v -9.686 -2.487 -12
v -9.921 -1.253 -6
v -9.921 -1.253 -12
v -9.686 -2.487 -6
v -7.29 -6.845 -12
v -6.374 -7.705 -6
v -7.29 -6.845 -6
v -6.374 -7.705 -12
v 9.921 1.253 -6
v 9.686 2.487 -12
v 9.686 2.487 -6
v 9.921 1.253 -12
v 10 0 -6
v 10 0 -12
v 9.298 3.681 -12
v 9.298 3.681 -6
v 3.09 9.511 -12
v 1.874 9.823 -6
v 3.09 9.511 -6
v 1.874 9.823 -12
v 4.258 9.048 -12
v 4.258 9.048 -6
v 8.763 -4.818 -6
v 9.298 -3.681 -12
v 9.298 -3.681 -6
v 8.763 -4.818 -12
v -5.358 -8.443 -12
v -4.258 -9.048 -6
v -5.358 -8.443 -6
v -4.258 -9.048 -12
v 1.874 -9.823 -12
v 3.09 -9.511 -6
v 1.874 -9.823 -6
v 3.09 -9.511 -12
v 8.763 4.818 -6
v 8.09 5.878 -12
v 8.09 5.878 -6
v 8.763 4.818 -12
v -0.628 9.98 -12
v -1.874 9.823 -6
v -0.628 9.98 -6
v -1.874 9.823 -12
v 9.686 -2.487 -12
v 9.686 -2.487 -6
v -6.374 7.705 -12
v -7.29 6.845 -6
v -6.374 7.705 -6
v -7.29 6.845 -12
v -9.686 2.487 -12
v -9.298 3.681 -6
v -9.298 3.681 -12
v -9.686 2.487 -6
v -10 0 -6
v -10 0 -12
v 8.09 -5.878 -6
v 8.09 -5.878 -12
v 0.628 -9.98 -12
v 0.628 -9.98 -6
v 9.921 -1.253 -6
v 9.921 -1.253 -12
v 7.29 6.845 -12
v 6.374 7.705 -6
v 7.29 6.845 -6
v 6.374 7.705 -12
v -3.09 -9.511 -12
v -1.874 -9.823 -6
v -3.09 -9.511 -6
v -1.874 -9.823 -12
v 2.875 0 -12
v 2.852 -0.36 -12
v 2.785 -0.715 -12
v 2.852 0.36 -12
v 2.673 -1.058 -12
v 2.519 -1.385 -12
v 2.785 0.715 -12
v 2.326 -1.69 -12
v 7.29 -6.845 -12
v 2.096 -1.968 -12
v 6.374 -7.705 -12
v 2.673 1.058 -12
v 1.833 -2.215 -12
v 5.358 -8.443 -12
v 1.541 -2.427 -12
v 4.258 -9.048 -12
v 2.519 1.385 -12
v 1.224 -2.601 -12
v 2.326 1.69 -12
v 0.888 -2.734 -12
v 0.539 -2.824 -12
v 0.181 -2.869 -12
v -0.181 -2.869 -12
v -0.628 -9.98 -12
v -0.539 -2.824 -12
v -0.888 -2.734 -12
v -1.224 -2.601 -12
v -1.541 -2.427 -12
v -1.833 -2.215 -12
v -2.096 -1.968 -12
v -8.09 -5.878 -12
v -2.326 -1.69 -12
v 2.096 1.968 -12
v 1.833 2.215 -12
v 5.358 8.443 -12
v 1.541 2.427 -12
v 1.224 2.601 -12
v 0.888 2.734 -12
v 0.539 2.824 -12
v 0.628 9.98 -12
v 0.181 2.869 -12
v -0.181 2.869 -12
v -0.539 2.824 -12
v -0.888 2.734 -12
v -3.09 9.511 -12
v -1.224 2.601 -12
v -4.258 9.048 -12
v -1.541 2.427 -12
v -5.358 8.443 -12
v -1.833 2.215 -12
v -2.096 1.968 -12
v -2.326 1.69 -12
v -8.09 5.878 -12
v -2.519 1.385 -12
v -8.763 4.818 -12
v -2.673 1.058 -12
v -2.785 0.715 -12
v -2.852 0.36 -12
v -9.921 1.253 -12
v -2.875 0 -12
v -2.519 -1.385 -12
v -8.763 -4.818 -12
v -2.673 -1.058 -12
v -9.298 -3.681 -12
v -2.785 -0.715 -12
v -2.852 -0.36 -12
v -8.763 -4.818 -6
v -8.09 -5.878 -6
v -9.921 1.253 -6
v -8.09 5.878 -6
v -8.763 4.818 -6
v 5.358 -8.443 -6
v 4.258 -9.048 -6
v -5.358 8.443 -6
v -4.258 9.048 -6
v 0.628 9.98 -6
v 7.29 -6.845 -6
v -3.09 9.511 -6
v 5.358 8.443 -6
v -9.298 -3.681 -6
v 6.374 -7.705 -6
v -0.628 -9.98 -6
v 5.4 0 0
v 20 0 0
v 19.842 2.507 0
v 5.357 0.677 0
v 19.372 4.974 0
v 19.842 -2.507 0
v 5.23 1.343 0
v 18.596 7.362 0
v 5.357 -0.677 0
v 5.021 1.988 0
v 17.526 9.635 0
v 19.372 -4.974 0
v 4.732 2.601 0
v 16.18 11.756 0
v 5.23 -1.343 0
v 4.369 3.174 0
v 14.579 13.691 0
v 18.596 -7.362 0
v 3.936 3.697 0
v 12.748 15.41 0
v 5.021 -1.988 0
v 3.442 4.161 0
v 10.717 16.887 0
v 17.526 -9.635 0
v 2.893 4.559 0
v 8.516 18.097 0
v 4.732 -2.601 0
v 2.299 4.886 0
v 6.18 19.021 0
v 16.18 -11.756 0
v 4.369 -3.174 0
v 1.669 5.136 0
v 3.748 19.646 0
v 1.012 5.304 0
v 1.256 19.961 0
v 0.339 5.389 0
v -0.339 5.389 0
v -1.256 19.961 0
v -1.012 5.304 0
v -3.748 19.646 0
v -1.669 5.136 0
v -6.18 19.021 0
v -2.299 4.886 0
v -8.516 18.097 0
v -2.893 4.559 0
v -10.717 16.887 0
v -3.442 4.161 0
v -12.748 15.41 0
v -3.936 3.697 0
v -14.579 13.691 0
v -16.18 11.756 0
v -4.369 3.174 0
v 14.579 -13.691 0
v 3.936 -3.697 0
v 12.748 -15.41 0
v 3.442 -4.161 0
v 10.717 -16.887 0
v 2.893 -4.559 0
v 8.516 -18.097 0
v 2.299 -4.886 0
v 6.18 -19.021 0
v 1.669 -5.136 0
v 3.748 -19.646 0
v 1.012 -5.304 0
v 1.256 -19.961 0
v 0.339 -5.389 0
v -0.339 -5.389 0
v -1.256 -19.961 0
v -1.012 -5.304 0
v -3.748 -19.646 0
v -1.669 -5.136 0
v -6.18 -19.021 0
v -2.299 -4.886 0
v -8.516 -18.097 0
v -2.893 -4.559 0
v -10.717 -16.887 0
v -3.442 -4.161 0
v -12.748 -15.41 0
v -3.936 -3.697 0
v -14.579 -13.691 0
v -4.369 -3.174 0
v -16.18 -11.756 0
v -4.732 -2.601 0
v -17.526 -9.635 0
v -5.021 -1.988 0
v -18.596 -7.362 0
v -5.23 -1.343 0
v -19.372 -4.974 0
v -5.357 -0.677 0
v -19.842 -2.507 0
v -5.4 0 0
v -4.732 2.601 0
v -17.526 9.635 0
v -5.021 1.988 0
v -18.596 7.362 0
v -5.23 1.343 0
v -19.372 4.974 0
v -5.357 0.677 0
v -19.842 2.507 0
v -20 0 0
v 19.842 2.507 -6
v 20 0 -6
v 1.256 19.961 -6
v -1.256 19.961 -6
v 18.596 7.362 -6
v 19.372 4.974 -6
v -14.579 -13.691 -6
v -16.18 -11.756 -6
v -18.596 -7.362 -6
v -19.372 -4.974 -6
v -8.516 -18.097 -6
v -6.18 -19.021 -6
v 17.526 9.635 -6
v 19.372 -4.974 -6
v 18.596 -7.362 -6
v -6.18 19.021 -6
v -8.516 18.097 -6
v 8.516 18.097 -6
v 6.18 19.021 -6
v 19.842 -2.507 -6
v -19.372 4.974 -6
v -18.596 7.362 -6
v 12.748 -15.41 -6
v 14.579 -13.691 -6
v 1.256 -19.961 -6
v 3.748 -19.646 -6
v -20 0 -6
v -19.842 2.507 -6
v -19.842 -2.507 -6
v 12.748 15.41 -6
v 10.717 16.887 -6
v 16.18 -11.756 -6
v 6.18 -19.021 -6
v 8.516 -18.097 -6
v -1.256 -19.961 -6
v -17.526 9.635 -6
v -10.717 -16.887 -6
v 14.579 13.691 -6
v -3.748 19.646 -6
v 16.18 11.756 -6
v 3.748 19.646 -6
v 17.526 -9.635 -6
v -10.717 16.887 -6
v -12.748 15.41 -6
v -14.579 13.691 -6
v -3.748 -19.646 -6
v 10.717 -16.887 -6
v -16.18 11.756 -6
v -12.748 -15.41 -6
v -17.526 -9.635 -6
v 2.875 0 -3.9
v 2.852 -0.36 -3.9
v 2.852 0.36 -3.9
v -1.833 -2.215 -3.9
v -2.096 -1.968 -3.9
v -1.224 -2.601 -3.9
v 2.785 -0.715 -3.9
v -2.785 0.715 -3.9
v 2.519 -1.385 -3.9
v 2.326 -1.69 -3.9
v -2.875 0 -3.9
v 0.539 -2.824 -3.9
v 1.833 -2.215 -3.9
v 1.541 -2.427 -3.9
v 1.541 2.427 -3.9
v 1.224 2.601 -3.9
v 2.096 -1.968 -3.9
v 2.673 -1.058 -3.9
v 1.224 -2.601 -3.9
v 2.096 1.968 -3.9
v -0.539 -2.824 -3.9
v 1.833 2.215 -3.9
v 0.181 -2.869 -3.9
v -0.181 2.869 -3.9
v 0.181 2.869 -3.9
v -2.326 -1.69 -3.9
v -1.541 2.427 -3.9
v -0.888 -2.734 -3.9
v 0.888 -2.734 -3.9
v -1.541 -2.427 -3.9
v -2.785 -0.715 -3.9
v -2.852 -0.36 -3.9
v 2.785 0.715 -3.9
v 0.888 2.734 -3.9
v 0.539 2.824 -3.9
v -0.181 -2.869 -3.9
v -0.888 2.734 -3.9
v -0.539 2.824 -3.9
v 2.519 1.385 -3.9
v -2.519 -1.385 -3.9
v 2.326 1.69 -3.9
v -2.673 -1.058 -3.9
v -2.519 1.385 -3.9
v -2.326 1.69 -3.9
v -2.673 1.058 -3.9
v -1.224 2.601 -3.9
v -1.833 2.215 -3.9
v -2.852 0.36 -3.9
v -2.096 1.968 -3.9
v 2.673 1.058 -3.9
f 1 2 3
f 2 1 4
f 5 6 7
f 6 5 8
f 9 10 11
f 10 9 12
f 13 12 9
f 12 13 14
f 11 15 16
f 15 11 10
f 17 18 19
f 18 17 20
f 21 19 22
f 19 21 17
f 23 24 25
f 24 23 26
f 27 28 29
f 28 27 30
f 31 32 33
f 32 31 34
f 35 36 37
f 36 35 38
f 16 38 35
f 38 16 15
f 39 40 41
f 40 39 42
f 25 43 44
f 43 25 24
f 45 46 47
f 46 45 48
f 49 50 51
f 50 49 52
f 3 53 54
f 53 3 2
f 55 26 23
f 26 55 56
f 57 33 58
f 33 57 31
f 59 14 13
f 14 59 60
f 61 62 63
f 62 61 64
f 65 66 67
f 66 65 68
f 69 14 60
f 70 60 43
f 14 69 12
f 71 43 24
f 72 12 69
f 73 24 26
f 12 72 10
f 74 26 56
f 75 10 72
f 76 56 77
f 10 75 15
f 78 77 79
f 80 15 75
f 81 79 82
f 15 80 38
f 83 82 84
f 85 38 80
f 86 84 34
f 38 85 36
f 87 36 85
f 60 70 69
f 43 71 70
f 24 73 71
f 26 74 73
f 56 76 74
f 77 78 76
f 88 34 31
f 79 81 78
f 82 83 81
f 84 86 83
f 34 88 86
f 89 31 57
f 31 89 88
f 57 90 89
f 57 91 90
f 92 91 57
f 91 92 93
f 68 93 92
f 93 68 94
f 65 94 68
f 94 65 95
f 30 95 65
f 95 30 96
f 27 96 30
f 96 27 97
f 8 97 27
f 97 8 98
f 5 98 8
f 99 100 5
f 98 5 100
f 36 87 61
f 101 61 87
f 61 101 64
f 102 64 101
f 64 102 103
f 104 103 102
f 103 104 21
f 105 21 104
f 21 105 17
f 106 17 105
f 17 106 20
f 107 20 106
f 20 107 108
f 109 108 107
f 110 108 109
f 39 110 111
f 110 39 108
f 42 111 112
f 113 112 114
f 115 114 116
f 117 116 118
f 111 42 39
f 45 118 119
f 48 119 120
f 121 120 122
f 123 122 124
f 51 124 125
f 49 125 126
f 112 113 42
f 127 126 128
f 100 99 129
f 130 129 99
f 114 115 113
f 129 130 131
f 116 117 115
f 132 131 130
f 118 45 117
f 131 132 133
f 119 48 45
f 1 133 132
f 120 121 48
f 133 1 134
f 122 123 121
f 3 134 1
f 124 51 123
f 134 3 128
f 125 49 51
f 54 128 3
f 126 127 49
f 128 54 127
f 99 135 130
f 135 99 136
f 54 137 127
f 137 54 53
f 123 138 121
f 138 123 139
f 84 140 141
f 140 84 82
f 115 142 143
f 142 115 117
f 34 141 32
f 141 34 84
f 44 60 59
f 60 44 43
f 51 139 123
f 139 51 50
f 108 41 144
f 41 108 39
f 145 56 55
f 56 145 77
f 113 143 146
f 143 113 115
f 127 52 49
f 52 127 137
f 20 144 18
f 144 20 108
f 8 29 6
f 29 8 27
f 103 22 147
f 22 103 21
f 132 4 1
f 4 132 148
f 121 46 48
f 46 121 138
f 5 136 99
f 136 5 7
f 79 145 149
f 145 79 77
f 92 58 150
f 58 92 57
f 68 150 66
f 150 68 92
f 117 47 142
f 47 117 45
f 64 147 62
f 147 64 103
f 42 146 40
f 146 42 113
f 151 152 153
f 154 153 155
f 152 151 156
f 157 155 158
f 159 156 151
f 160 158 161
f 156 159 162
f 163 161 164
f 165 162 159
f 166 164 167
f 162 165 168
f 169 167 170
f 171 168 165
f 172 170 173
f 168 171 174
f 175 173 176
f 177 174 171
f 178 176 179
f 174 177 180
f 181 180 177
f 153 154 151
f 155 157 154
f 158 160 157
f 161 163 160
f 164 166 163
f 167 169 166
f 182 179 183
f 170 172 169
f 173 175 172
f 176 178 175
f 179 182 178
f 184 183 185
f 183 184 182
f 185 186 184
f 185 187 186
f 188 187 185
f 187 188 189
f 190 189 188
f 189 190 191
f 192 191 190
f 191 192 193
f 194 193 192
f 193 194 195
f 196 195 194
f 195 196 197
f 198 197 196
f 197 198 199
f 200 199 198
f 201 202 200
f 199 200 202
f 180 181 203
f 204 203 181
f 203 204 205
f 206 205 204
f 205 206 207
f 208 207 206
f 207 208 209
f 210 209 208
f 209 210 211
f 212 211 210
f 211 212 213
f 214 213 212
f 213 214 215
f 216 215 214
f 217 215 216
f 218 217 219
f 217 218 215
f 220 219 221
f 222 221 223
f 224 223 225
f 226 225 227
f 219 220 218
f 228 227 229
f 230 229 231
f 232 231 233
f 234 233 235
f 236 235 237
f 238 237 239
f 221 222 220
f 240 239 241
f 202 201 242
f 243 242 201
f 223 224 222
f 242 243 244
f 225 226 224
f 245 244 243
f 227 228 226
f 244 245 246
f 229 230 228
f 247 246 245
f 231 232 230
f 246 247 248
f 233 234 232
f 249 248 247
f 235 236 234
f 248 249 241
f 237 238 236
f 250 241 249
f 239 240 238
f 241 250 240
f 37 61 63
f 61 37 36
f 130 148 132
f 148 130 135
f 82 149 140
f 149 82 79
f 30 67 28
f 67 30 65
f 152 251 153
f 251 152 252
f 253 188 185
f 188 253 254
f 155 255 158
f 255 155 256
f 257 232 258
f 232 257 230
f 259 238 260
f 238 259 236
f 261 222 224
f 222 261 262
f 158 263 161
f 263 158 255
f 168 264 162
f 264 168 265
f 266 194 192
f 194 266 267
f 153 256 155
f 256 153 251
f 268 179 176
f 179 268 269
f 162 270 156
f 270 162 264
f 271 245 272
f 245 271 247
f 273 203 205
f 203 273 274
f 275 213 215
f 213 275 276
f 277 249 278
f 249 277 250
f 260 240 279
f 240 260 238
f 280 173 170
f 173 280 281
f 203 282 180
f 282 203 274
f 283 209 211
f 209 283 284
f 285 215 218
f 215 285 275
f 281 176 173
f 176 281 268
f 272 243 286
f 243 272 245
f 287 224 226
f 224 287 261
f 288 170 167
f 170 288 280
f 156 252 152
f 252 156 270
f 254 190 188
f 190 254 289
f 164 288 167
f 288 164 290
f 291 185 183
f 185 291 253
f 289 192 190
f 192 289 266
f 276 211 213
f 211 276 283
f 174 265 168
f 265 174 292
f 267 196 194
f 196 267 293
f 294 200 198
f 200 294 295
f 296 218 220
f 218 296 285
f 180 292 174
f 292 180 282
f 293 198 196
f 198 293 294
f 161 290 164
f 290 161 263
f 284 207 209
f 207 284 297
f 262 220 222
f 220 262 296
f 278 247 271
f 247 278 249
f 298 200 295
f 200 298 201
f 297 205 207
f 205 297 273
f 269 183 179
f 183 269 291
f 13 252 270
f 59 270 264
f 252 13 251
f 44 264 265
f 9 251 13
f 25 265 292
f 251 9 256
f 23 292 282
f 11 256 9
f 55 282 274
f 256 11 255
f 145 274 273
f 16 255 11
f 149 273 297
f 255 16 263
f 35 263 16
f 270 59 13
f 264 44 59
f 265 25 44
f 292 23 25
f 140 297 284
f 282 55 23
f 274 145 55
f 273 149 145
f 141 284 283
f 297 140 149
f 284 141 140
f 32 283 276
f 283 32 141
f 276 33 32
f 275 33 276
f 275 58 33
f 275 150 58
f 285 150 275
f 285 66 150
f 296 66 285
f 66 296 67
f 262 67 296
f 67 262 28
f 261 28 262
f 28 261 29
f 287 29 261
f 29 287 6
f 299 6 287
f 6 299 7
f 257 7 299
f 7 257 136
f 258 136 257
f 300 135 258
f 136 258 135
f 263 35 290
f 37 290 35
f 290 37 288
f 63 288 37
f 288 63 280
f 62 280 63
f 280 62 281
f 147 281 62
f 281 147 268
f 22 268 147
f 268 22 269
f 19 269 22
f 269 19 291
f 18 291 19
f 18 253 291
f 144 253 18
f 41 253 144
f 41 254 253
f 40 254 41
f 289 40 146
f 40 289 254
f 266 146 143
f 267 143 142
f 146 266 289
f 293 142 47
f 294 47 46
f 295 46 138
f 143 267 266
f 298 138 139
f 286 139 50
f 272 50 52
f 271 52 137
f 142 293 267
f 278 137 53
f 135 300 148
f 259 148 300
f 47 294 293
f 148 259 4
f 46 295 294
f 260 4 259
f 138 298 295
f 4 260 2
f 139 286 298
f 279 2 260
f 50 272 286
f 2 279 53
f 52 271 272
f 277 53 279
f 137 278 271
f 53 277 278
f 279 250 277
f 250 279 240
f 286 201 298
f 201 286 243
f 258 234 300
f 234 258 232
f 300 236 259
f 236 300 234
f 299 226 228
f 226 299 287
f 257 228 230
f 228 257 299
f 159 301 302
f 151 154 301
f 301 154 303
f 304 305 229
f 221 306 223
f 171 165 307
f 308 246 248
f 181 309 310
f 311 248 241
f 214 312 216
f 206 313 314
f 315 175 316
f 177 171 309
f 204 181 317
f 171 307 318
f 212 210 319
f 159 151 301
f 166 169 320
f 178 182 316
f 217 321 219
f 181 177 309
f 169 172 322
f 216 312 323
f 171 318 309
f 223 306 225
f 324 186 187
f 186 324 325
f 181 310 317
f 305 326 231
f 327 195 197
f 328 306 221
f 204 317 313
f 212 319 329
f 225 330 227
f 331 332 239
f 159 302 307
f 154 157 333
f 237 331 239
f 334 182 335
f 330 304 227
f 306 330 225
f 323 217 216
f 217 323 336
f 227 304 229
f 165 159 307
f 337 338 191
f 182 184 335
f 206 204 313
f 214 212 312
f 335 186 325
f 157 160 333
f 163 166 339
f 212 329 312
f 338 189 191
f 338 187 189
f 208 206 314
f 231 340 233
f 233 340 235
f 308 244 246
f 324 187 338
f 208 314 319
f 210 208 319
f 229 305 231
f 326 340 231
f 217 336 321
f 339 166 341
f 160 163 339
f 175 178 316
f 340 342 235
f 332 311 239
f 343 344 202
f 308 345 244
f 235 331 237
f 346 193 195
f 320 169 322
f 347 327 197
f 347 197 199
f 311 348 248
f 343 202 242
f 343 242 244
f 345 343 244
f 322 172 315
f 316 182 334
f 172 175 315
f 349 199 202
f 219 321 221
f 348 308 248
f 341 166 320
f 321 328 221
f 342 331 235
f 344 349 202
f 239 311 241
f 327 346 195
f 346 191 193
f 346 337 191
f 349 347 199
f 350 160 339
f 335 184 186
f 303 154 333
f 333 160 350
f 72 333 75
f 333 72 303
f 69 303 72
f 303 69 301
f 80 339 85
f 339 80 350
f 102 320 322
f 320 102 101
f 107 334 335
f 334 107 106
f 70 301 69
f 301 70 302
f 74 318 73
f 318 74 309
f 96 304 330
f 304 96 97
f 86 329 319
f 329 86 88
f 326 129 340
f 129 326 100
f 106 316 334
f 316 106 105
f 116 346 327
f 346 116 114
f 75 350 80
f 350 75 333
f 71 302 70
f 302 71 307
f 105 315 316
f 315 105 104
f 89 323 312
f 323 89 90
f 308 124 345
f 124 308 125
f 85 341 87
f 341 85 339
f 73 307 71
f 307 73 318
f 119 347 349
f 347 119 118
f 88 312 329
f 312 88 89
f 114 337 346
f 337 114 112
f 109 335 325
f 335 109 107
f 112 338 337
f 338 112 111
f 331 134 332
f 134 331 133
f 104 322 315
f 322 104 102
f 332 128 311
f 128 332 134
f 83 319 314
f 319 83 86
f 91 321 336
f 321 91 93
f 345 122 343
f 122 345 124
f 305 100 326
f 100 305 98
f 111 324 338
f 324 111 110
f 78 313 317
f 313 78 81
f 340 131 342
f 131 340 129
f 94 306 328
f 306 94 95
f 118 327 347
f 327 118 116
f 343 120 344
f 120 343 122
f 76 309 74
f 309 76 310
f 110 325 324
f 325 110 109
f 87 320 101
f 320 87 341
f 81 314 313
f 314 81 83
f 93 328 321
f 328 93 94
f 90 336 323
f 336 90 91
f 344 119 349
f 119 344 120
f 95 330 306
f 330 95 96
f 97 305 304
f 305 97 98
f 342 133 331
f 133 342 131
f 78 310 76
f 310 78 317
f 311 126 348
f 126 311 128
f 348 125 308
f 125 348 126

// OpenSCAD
$fn = 50;


difference() {
	union() {
		translate(v = [0, 0, -12.0000000000]) {
			cylinder(h = 12, r = 10.0000000000);
		}
		translate(v = [0, 0, -6.0000000000]) {
			cylinder(h = 6, r = 20.0000000000);
		}
	}
	union() {
		translate(v = [0, 0, 0]) {
			rotate(a = [0, 0, 0]) {
				difference() {
					union() {
						#translate(v = [0, 0, -12.0000000000]) {
							cylinder(h = 12, r = 2.6000000000);
						}
						#translate(v = [0, 0, -3.9000000000]) {
							cylinder(h = 3.9000000000, r = 10.0000000000, r1 = 2.8750000000, r2 = 5.4000000000);
						}
						#translate(v = [0, 0, -12.0000000000]) {
							cylinder(h = 12, r = 2.8750000000);
						}
						#translate(v = [0, 0, -12.0000000000]) {
							cylinder(h = 12, r = 2.6000000000);
						}
					}
					union();
				}
			}
		}
	}
}
